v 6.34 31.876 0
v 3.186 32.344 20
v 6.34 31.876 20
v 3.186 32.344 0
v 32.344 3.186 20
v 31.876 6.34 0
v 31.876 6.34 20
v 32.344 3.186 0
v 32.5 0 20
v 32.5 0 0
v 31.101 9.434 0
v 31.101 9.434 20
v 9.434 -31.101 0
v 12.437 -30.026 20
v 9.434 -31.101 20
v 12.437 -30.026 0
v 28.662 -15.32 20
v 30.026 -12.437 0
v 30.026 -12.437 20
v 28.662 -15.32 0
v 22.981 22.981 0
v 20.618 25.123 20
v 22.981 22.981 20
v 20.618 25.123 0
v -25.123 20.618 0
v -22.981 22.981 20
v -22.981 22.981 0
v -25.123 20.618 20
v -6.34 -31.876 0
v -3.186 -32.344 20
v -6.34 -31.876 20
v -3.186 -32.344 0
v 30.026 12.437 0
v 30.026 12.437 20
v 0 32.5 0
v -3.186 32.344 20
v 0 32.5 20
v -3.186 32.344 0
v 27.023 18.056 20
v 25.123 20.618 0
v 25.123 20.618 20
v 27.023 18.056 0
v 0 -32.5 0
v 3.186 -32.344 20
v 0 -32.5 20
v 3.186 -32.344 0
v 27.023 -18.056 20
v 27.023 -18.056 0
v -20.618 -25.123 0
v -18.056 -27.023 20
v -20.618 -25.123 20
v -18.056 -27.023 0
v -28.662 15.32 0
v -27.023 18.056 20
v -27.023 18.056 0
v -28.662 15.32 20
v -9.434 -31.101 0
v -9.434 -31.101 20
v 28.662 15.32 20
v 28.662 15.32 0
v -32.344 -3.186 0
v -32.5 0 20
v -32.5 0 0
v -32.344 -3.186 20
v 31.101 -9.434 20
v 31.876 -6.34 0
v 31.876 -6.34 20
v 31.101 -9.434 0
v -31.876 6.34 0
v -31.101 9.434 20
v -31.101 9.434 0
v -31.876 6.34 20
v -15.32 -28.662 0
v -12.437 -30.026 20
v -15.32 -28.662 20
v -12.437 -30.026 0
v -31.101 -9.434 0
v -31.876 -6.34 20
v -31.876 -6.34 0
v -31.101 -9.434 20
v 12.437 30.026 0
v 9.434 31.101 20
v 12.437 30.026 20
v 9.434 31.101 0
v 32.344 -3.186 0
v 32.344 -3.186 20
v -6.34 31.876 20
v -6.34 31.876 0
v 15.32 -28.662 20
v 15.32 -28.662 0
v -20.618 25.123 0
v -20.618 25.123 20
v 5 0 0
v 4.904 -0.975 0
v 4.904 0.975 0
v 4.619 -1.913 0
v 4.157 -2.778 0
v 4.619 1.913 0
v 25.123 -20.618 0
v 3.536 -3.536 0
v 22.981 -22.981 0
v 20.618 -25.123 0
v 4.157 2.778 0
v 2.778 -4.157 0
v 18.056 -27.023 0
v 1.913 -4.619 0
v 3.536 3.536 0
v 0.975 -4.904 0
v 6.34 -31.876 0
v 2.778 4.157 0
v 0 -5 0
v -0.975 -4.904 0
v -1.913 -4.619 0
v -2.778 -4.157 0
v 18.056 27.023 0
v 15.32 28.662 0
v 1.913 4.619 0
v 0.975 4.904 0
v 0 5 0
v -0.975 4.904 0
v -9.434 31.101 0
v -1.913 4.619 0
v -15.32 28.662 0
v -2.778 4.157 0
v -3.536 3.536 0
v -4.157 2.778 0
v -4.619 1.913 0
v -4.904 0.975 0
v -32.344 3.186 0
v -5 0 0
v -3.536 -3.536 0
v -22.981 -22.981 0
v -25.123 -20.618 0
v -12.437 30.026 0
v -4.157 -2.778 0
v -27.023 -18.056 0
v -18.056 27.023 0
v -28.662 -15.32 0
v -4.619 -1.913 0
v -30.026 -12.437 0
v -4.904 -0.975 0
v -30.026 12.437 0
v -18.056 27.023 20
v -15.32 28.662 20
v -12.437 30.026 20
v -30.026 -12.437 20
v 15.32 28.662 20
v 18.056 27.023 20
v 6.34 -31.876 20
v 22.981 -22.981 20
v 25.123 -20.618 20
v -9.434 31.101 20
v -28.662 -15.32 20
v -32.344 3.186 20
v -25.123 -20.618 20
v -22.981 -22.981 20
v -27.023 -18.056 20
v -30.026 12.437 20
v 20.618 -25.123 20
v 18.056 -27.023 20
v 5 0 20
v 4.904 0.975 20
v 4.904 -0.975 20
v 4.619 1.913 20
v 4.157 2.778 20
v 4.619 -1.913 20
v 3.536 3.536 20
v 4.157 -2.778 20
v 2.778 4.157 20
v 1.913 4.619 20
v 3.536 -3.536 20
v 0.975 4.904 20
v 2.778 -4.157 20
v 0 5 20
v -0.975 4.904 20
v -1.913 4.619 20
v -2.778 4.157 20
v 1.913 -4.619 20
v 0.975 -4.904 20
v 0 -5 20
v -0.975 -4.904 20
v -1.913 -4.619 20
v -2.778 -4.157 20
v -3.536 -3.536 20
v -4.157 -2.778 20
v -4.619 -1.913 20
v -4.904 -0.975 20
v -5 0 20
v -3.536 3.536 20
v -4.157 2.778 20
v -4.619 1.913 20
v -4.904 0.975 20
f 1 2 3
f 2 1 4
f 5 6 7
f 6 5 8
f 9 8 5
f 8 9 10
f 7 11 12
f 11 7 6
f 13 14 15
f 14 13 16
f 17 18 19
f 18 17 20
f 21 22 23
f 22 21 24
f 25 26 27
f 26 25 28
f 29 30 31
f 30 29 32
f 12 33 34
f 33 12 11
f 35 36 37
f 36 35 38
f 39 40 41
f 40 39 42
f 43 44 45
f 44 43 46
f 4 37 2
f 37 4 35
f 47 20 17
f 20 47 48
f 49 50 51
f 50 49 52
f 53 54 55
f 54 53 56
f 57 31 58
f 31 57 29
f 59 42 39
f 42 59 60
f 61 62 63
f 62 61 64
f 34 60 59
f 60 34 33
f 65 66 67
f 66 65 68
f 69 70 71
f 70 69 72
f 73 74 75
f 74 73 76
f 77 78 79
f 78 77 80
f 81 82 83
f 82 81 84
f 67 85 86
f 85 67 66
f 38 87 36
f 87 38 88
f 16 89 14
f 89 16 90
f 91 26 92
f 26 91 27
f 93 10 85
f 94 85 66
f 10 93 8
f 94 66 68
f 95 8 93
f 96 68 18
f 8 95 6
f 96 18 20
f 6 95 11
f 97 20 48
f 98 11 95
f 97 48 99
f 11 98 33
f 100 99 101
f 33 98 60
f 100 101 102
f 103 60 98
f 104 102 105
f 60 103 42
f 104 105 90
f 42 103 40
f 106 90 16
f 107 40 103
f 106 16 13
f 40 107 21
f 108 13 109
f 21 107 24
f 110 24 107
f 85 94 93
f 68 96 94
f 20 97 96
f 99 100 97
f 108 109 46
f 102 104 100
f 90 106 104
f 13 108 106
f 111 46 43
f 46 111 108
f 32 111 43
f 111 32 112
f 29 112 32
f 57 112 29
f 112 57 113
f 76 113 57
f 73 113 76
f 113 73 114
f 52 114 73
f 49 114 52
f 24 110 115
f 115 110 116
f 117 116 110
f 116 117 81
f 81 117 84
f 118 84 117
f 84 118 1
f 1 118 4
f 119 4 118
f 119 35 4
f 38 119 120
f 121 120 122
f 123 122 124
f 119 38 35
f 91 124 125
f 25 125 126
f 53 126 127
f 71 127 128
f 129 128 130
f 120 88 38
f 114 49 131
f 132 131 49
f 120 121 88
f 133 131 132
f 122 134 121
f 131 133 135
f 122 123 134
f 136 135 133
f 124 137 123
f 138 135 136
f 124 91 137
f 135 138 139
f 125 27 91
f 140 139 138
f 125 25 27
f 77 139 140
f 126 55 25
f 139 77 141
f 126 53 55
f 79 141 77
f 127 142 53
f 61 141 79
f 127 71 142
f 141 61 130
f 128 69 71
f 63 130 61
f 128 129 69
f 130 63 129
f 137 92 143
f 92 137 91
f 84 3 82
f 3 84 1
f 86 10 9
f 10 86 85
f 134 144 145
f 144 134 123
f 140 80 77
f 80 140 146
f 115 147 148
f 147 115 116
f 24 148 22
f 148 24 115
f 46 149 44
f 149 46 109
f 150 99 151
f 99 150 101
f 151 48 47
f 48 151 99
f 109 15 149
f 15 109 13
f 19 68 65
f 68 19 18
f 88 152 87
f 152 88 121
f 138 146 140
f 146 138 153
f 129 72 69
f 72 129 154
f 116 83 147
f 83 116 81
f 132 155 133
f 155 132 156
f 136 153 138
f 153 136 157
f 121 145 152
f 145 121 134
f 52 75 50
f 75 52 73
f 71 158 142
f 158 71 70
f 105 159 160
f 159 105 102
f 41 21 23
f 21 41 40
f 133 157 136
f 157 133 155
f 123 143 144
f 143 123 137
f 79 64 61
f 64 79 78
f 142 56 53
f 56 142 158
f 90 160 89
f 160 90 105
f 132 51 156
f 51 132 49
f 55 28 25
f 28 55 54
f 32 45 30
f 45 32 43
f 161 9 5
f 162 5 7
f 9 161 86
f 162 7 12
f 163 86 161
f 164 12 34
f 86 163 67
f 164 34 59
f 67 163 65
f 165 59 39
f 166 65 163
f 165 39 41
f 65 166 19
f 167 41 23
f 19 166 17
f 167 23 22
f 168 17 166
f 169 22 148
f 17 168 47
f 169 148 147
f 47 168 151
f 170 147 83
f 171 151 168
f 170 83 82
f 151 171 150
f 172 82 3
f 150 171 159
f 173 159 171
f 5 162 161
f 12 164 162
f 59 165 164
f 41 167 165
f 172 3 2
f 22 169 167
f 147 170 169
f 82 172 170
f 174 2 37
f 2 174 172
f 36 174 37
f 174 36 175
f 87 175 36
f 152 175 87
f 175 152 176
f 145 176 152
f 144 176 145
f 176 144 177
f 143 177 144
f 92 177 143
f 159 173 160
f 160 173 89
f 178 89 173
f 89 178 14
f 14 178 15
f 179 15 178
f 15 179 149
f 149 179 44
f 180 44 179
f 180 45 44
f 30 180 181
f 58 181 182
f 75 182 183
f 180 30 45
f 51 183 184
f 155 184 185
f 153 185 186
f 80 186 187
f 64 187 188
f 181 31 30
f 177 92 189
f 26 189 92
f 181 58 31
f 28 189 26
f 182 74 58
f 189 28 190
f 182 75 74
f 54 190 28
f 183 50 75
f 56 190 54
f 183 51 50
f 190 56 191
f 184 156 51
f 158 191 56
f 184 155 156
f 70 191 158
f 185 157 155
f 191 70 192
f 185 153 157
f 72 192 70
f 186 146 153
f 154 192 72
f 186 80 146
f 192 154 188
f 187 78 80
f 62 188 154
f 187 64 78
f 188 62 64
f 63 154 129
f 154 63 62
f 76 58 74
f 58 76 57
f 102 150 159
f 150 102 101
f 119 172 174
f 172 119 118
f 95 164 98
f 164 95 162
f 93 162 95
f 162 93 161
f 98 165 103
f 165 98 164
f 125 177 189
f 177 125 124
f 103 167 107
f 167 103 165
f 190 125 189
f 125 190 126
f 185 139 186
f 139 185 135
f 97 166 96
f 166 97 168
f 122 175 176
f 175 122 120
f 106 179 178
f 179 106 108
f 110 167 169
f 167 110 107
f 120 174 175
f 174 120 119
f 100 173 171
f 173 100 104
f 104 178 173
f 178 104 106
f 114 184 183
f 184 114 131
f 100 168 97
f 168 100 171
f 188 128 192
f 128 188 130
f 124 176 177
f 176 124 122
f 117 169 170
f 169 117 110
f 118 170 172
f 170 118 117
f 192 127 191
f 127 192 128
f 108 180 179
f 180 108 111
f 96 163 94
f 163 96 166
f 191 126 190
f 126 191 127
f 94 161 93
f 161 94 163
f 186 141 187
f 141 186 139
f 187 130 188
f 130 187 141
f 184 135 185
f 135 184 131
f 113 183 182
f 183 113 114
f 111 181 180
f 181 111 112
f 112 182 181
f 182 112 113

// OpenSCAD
module wheel_65(d=65,w=20,hub=5){
  difference(){
    cylinder(h=w,r=d/2,$fn=64);
    translate([0,0,-0.1]) cylinder(h=w+0.2,r=hub,$fn=32);
  }
}
wheel_65();
